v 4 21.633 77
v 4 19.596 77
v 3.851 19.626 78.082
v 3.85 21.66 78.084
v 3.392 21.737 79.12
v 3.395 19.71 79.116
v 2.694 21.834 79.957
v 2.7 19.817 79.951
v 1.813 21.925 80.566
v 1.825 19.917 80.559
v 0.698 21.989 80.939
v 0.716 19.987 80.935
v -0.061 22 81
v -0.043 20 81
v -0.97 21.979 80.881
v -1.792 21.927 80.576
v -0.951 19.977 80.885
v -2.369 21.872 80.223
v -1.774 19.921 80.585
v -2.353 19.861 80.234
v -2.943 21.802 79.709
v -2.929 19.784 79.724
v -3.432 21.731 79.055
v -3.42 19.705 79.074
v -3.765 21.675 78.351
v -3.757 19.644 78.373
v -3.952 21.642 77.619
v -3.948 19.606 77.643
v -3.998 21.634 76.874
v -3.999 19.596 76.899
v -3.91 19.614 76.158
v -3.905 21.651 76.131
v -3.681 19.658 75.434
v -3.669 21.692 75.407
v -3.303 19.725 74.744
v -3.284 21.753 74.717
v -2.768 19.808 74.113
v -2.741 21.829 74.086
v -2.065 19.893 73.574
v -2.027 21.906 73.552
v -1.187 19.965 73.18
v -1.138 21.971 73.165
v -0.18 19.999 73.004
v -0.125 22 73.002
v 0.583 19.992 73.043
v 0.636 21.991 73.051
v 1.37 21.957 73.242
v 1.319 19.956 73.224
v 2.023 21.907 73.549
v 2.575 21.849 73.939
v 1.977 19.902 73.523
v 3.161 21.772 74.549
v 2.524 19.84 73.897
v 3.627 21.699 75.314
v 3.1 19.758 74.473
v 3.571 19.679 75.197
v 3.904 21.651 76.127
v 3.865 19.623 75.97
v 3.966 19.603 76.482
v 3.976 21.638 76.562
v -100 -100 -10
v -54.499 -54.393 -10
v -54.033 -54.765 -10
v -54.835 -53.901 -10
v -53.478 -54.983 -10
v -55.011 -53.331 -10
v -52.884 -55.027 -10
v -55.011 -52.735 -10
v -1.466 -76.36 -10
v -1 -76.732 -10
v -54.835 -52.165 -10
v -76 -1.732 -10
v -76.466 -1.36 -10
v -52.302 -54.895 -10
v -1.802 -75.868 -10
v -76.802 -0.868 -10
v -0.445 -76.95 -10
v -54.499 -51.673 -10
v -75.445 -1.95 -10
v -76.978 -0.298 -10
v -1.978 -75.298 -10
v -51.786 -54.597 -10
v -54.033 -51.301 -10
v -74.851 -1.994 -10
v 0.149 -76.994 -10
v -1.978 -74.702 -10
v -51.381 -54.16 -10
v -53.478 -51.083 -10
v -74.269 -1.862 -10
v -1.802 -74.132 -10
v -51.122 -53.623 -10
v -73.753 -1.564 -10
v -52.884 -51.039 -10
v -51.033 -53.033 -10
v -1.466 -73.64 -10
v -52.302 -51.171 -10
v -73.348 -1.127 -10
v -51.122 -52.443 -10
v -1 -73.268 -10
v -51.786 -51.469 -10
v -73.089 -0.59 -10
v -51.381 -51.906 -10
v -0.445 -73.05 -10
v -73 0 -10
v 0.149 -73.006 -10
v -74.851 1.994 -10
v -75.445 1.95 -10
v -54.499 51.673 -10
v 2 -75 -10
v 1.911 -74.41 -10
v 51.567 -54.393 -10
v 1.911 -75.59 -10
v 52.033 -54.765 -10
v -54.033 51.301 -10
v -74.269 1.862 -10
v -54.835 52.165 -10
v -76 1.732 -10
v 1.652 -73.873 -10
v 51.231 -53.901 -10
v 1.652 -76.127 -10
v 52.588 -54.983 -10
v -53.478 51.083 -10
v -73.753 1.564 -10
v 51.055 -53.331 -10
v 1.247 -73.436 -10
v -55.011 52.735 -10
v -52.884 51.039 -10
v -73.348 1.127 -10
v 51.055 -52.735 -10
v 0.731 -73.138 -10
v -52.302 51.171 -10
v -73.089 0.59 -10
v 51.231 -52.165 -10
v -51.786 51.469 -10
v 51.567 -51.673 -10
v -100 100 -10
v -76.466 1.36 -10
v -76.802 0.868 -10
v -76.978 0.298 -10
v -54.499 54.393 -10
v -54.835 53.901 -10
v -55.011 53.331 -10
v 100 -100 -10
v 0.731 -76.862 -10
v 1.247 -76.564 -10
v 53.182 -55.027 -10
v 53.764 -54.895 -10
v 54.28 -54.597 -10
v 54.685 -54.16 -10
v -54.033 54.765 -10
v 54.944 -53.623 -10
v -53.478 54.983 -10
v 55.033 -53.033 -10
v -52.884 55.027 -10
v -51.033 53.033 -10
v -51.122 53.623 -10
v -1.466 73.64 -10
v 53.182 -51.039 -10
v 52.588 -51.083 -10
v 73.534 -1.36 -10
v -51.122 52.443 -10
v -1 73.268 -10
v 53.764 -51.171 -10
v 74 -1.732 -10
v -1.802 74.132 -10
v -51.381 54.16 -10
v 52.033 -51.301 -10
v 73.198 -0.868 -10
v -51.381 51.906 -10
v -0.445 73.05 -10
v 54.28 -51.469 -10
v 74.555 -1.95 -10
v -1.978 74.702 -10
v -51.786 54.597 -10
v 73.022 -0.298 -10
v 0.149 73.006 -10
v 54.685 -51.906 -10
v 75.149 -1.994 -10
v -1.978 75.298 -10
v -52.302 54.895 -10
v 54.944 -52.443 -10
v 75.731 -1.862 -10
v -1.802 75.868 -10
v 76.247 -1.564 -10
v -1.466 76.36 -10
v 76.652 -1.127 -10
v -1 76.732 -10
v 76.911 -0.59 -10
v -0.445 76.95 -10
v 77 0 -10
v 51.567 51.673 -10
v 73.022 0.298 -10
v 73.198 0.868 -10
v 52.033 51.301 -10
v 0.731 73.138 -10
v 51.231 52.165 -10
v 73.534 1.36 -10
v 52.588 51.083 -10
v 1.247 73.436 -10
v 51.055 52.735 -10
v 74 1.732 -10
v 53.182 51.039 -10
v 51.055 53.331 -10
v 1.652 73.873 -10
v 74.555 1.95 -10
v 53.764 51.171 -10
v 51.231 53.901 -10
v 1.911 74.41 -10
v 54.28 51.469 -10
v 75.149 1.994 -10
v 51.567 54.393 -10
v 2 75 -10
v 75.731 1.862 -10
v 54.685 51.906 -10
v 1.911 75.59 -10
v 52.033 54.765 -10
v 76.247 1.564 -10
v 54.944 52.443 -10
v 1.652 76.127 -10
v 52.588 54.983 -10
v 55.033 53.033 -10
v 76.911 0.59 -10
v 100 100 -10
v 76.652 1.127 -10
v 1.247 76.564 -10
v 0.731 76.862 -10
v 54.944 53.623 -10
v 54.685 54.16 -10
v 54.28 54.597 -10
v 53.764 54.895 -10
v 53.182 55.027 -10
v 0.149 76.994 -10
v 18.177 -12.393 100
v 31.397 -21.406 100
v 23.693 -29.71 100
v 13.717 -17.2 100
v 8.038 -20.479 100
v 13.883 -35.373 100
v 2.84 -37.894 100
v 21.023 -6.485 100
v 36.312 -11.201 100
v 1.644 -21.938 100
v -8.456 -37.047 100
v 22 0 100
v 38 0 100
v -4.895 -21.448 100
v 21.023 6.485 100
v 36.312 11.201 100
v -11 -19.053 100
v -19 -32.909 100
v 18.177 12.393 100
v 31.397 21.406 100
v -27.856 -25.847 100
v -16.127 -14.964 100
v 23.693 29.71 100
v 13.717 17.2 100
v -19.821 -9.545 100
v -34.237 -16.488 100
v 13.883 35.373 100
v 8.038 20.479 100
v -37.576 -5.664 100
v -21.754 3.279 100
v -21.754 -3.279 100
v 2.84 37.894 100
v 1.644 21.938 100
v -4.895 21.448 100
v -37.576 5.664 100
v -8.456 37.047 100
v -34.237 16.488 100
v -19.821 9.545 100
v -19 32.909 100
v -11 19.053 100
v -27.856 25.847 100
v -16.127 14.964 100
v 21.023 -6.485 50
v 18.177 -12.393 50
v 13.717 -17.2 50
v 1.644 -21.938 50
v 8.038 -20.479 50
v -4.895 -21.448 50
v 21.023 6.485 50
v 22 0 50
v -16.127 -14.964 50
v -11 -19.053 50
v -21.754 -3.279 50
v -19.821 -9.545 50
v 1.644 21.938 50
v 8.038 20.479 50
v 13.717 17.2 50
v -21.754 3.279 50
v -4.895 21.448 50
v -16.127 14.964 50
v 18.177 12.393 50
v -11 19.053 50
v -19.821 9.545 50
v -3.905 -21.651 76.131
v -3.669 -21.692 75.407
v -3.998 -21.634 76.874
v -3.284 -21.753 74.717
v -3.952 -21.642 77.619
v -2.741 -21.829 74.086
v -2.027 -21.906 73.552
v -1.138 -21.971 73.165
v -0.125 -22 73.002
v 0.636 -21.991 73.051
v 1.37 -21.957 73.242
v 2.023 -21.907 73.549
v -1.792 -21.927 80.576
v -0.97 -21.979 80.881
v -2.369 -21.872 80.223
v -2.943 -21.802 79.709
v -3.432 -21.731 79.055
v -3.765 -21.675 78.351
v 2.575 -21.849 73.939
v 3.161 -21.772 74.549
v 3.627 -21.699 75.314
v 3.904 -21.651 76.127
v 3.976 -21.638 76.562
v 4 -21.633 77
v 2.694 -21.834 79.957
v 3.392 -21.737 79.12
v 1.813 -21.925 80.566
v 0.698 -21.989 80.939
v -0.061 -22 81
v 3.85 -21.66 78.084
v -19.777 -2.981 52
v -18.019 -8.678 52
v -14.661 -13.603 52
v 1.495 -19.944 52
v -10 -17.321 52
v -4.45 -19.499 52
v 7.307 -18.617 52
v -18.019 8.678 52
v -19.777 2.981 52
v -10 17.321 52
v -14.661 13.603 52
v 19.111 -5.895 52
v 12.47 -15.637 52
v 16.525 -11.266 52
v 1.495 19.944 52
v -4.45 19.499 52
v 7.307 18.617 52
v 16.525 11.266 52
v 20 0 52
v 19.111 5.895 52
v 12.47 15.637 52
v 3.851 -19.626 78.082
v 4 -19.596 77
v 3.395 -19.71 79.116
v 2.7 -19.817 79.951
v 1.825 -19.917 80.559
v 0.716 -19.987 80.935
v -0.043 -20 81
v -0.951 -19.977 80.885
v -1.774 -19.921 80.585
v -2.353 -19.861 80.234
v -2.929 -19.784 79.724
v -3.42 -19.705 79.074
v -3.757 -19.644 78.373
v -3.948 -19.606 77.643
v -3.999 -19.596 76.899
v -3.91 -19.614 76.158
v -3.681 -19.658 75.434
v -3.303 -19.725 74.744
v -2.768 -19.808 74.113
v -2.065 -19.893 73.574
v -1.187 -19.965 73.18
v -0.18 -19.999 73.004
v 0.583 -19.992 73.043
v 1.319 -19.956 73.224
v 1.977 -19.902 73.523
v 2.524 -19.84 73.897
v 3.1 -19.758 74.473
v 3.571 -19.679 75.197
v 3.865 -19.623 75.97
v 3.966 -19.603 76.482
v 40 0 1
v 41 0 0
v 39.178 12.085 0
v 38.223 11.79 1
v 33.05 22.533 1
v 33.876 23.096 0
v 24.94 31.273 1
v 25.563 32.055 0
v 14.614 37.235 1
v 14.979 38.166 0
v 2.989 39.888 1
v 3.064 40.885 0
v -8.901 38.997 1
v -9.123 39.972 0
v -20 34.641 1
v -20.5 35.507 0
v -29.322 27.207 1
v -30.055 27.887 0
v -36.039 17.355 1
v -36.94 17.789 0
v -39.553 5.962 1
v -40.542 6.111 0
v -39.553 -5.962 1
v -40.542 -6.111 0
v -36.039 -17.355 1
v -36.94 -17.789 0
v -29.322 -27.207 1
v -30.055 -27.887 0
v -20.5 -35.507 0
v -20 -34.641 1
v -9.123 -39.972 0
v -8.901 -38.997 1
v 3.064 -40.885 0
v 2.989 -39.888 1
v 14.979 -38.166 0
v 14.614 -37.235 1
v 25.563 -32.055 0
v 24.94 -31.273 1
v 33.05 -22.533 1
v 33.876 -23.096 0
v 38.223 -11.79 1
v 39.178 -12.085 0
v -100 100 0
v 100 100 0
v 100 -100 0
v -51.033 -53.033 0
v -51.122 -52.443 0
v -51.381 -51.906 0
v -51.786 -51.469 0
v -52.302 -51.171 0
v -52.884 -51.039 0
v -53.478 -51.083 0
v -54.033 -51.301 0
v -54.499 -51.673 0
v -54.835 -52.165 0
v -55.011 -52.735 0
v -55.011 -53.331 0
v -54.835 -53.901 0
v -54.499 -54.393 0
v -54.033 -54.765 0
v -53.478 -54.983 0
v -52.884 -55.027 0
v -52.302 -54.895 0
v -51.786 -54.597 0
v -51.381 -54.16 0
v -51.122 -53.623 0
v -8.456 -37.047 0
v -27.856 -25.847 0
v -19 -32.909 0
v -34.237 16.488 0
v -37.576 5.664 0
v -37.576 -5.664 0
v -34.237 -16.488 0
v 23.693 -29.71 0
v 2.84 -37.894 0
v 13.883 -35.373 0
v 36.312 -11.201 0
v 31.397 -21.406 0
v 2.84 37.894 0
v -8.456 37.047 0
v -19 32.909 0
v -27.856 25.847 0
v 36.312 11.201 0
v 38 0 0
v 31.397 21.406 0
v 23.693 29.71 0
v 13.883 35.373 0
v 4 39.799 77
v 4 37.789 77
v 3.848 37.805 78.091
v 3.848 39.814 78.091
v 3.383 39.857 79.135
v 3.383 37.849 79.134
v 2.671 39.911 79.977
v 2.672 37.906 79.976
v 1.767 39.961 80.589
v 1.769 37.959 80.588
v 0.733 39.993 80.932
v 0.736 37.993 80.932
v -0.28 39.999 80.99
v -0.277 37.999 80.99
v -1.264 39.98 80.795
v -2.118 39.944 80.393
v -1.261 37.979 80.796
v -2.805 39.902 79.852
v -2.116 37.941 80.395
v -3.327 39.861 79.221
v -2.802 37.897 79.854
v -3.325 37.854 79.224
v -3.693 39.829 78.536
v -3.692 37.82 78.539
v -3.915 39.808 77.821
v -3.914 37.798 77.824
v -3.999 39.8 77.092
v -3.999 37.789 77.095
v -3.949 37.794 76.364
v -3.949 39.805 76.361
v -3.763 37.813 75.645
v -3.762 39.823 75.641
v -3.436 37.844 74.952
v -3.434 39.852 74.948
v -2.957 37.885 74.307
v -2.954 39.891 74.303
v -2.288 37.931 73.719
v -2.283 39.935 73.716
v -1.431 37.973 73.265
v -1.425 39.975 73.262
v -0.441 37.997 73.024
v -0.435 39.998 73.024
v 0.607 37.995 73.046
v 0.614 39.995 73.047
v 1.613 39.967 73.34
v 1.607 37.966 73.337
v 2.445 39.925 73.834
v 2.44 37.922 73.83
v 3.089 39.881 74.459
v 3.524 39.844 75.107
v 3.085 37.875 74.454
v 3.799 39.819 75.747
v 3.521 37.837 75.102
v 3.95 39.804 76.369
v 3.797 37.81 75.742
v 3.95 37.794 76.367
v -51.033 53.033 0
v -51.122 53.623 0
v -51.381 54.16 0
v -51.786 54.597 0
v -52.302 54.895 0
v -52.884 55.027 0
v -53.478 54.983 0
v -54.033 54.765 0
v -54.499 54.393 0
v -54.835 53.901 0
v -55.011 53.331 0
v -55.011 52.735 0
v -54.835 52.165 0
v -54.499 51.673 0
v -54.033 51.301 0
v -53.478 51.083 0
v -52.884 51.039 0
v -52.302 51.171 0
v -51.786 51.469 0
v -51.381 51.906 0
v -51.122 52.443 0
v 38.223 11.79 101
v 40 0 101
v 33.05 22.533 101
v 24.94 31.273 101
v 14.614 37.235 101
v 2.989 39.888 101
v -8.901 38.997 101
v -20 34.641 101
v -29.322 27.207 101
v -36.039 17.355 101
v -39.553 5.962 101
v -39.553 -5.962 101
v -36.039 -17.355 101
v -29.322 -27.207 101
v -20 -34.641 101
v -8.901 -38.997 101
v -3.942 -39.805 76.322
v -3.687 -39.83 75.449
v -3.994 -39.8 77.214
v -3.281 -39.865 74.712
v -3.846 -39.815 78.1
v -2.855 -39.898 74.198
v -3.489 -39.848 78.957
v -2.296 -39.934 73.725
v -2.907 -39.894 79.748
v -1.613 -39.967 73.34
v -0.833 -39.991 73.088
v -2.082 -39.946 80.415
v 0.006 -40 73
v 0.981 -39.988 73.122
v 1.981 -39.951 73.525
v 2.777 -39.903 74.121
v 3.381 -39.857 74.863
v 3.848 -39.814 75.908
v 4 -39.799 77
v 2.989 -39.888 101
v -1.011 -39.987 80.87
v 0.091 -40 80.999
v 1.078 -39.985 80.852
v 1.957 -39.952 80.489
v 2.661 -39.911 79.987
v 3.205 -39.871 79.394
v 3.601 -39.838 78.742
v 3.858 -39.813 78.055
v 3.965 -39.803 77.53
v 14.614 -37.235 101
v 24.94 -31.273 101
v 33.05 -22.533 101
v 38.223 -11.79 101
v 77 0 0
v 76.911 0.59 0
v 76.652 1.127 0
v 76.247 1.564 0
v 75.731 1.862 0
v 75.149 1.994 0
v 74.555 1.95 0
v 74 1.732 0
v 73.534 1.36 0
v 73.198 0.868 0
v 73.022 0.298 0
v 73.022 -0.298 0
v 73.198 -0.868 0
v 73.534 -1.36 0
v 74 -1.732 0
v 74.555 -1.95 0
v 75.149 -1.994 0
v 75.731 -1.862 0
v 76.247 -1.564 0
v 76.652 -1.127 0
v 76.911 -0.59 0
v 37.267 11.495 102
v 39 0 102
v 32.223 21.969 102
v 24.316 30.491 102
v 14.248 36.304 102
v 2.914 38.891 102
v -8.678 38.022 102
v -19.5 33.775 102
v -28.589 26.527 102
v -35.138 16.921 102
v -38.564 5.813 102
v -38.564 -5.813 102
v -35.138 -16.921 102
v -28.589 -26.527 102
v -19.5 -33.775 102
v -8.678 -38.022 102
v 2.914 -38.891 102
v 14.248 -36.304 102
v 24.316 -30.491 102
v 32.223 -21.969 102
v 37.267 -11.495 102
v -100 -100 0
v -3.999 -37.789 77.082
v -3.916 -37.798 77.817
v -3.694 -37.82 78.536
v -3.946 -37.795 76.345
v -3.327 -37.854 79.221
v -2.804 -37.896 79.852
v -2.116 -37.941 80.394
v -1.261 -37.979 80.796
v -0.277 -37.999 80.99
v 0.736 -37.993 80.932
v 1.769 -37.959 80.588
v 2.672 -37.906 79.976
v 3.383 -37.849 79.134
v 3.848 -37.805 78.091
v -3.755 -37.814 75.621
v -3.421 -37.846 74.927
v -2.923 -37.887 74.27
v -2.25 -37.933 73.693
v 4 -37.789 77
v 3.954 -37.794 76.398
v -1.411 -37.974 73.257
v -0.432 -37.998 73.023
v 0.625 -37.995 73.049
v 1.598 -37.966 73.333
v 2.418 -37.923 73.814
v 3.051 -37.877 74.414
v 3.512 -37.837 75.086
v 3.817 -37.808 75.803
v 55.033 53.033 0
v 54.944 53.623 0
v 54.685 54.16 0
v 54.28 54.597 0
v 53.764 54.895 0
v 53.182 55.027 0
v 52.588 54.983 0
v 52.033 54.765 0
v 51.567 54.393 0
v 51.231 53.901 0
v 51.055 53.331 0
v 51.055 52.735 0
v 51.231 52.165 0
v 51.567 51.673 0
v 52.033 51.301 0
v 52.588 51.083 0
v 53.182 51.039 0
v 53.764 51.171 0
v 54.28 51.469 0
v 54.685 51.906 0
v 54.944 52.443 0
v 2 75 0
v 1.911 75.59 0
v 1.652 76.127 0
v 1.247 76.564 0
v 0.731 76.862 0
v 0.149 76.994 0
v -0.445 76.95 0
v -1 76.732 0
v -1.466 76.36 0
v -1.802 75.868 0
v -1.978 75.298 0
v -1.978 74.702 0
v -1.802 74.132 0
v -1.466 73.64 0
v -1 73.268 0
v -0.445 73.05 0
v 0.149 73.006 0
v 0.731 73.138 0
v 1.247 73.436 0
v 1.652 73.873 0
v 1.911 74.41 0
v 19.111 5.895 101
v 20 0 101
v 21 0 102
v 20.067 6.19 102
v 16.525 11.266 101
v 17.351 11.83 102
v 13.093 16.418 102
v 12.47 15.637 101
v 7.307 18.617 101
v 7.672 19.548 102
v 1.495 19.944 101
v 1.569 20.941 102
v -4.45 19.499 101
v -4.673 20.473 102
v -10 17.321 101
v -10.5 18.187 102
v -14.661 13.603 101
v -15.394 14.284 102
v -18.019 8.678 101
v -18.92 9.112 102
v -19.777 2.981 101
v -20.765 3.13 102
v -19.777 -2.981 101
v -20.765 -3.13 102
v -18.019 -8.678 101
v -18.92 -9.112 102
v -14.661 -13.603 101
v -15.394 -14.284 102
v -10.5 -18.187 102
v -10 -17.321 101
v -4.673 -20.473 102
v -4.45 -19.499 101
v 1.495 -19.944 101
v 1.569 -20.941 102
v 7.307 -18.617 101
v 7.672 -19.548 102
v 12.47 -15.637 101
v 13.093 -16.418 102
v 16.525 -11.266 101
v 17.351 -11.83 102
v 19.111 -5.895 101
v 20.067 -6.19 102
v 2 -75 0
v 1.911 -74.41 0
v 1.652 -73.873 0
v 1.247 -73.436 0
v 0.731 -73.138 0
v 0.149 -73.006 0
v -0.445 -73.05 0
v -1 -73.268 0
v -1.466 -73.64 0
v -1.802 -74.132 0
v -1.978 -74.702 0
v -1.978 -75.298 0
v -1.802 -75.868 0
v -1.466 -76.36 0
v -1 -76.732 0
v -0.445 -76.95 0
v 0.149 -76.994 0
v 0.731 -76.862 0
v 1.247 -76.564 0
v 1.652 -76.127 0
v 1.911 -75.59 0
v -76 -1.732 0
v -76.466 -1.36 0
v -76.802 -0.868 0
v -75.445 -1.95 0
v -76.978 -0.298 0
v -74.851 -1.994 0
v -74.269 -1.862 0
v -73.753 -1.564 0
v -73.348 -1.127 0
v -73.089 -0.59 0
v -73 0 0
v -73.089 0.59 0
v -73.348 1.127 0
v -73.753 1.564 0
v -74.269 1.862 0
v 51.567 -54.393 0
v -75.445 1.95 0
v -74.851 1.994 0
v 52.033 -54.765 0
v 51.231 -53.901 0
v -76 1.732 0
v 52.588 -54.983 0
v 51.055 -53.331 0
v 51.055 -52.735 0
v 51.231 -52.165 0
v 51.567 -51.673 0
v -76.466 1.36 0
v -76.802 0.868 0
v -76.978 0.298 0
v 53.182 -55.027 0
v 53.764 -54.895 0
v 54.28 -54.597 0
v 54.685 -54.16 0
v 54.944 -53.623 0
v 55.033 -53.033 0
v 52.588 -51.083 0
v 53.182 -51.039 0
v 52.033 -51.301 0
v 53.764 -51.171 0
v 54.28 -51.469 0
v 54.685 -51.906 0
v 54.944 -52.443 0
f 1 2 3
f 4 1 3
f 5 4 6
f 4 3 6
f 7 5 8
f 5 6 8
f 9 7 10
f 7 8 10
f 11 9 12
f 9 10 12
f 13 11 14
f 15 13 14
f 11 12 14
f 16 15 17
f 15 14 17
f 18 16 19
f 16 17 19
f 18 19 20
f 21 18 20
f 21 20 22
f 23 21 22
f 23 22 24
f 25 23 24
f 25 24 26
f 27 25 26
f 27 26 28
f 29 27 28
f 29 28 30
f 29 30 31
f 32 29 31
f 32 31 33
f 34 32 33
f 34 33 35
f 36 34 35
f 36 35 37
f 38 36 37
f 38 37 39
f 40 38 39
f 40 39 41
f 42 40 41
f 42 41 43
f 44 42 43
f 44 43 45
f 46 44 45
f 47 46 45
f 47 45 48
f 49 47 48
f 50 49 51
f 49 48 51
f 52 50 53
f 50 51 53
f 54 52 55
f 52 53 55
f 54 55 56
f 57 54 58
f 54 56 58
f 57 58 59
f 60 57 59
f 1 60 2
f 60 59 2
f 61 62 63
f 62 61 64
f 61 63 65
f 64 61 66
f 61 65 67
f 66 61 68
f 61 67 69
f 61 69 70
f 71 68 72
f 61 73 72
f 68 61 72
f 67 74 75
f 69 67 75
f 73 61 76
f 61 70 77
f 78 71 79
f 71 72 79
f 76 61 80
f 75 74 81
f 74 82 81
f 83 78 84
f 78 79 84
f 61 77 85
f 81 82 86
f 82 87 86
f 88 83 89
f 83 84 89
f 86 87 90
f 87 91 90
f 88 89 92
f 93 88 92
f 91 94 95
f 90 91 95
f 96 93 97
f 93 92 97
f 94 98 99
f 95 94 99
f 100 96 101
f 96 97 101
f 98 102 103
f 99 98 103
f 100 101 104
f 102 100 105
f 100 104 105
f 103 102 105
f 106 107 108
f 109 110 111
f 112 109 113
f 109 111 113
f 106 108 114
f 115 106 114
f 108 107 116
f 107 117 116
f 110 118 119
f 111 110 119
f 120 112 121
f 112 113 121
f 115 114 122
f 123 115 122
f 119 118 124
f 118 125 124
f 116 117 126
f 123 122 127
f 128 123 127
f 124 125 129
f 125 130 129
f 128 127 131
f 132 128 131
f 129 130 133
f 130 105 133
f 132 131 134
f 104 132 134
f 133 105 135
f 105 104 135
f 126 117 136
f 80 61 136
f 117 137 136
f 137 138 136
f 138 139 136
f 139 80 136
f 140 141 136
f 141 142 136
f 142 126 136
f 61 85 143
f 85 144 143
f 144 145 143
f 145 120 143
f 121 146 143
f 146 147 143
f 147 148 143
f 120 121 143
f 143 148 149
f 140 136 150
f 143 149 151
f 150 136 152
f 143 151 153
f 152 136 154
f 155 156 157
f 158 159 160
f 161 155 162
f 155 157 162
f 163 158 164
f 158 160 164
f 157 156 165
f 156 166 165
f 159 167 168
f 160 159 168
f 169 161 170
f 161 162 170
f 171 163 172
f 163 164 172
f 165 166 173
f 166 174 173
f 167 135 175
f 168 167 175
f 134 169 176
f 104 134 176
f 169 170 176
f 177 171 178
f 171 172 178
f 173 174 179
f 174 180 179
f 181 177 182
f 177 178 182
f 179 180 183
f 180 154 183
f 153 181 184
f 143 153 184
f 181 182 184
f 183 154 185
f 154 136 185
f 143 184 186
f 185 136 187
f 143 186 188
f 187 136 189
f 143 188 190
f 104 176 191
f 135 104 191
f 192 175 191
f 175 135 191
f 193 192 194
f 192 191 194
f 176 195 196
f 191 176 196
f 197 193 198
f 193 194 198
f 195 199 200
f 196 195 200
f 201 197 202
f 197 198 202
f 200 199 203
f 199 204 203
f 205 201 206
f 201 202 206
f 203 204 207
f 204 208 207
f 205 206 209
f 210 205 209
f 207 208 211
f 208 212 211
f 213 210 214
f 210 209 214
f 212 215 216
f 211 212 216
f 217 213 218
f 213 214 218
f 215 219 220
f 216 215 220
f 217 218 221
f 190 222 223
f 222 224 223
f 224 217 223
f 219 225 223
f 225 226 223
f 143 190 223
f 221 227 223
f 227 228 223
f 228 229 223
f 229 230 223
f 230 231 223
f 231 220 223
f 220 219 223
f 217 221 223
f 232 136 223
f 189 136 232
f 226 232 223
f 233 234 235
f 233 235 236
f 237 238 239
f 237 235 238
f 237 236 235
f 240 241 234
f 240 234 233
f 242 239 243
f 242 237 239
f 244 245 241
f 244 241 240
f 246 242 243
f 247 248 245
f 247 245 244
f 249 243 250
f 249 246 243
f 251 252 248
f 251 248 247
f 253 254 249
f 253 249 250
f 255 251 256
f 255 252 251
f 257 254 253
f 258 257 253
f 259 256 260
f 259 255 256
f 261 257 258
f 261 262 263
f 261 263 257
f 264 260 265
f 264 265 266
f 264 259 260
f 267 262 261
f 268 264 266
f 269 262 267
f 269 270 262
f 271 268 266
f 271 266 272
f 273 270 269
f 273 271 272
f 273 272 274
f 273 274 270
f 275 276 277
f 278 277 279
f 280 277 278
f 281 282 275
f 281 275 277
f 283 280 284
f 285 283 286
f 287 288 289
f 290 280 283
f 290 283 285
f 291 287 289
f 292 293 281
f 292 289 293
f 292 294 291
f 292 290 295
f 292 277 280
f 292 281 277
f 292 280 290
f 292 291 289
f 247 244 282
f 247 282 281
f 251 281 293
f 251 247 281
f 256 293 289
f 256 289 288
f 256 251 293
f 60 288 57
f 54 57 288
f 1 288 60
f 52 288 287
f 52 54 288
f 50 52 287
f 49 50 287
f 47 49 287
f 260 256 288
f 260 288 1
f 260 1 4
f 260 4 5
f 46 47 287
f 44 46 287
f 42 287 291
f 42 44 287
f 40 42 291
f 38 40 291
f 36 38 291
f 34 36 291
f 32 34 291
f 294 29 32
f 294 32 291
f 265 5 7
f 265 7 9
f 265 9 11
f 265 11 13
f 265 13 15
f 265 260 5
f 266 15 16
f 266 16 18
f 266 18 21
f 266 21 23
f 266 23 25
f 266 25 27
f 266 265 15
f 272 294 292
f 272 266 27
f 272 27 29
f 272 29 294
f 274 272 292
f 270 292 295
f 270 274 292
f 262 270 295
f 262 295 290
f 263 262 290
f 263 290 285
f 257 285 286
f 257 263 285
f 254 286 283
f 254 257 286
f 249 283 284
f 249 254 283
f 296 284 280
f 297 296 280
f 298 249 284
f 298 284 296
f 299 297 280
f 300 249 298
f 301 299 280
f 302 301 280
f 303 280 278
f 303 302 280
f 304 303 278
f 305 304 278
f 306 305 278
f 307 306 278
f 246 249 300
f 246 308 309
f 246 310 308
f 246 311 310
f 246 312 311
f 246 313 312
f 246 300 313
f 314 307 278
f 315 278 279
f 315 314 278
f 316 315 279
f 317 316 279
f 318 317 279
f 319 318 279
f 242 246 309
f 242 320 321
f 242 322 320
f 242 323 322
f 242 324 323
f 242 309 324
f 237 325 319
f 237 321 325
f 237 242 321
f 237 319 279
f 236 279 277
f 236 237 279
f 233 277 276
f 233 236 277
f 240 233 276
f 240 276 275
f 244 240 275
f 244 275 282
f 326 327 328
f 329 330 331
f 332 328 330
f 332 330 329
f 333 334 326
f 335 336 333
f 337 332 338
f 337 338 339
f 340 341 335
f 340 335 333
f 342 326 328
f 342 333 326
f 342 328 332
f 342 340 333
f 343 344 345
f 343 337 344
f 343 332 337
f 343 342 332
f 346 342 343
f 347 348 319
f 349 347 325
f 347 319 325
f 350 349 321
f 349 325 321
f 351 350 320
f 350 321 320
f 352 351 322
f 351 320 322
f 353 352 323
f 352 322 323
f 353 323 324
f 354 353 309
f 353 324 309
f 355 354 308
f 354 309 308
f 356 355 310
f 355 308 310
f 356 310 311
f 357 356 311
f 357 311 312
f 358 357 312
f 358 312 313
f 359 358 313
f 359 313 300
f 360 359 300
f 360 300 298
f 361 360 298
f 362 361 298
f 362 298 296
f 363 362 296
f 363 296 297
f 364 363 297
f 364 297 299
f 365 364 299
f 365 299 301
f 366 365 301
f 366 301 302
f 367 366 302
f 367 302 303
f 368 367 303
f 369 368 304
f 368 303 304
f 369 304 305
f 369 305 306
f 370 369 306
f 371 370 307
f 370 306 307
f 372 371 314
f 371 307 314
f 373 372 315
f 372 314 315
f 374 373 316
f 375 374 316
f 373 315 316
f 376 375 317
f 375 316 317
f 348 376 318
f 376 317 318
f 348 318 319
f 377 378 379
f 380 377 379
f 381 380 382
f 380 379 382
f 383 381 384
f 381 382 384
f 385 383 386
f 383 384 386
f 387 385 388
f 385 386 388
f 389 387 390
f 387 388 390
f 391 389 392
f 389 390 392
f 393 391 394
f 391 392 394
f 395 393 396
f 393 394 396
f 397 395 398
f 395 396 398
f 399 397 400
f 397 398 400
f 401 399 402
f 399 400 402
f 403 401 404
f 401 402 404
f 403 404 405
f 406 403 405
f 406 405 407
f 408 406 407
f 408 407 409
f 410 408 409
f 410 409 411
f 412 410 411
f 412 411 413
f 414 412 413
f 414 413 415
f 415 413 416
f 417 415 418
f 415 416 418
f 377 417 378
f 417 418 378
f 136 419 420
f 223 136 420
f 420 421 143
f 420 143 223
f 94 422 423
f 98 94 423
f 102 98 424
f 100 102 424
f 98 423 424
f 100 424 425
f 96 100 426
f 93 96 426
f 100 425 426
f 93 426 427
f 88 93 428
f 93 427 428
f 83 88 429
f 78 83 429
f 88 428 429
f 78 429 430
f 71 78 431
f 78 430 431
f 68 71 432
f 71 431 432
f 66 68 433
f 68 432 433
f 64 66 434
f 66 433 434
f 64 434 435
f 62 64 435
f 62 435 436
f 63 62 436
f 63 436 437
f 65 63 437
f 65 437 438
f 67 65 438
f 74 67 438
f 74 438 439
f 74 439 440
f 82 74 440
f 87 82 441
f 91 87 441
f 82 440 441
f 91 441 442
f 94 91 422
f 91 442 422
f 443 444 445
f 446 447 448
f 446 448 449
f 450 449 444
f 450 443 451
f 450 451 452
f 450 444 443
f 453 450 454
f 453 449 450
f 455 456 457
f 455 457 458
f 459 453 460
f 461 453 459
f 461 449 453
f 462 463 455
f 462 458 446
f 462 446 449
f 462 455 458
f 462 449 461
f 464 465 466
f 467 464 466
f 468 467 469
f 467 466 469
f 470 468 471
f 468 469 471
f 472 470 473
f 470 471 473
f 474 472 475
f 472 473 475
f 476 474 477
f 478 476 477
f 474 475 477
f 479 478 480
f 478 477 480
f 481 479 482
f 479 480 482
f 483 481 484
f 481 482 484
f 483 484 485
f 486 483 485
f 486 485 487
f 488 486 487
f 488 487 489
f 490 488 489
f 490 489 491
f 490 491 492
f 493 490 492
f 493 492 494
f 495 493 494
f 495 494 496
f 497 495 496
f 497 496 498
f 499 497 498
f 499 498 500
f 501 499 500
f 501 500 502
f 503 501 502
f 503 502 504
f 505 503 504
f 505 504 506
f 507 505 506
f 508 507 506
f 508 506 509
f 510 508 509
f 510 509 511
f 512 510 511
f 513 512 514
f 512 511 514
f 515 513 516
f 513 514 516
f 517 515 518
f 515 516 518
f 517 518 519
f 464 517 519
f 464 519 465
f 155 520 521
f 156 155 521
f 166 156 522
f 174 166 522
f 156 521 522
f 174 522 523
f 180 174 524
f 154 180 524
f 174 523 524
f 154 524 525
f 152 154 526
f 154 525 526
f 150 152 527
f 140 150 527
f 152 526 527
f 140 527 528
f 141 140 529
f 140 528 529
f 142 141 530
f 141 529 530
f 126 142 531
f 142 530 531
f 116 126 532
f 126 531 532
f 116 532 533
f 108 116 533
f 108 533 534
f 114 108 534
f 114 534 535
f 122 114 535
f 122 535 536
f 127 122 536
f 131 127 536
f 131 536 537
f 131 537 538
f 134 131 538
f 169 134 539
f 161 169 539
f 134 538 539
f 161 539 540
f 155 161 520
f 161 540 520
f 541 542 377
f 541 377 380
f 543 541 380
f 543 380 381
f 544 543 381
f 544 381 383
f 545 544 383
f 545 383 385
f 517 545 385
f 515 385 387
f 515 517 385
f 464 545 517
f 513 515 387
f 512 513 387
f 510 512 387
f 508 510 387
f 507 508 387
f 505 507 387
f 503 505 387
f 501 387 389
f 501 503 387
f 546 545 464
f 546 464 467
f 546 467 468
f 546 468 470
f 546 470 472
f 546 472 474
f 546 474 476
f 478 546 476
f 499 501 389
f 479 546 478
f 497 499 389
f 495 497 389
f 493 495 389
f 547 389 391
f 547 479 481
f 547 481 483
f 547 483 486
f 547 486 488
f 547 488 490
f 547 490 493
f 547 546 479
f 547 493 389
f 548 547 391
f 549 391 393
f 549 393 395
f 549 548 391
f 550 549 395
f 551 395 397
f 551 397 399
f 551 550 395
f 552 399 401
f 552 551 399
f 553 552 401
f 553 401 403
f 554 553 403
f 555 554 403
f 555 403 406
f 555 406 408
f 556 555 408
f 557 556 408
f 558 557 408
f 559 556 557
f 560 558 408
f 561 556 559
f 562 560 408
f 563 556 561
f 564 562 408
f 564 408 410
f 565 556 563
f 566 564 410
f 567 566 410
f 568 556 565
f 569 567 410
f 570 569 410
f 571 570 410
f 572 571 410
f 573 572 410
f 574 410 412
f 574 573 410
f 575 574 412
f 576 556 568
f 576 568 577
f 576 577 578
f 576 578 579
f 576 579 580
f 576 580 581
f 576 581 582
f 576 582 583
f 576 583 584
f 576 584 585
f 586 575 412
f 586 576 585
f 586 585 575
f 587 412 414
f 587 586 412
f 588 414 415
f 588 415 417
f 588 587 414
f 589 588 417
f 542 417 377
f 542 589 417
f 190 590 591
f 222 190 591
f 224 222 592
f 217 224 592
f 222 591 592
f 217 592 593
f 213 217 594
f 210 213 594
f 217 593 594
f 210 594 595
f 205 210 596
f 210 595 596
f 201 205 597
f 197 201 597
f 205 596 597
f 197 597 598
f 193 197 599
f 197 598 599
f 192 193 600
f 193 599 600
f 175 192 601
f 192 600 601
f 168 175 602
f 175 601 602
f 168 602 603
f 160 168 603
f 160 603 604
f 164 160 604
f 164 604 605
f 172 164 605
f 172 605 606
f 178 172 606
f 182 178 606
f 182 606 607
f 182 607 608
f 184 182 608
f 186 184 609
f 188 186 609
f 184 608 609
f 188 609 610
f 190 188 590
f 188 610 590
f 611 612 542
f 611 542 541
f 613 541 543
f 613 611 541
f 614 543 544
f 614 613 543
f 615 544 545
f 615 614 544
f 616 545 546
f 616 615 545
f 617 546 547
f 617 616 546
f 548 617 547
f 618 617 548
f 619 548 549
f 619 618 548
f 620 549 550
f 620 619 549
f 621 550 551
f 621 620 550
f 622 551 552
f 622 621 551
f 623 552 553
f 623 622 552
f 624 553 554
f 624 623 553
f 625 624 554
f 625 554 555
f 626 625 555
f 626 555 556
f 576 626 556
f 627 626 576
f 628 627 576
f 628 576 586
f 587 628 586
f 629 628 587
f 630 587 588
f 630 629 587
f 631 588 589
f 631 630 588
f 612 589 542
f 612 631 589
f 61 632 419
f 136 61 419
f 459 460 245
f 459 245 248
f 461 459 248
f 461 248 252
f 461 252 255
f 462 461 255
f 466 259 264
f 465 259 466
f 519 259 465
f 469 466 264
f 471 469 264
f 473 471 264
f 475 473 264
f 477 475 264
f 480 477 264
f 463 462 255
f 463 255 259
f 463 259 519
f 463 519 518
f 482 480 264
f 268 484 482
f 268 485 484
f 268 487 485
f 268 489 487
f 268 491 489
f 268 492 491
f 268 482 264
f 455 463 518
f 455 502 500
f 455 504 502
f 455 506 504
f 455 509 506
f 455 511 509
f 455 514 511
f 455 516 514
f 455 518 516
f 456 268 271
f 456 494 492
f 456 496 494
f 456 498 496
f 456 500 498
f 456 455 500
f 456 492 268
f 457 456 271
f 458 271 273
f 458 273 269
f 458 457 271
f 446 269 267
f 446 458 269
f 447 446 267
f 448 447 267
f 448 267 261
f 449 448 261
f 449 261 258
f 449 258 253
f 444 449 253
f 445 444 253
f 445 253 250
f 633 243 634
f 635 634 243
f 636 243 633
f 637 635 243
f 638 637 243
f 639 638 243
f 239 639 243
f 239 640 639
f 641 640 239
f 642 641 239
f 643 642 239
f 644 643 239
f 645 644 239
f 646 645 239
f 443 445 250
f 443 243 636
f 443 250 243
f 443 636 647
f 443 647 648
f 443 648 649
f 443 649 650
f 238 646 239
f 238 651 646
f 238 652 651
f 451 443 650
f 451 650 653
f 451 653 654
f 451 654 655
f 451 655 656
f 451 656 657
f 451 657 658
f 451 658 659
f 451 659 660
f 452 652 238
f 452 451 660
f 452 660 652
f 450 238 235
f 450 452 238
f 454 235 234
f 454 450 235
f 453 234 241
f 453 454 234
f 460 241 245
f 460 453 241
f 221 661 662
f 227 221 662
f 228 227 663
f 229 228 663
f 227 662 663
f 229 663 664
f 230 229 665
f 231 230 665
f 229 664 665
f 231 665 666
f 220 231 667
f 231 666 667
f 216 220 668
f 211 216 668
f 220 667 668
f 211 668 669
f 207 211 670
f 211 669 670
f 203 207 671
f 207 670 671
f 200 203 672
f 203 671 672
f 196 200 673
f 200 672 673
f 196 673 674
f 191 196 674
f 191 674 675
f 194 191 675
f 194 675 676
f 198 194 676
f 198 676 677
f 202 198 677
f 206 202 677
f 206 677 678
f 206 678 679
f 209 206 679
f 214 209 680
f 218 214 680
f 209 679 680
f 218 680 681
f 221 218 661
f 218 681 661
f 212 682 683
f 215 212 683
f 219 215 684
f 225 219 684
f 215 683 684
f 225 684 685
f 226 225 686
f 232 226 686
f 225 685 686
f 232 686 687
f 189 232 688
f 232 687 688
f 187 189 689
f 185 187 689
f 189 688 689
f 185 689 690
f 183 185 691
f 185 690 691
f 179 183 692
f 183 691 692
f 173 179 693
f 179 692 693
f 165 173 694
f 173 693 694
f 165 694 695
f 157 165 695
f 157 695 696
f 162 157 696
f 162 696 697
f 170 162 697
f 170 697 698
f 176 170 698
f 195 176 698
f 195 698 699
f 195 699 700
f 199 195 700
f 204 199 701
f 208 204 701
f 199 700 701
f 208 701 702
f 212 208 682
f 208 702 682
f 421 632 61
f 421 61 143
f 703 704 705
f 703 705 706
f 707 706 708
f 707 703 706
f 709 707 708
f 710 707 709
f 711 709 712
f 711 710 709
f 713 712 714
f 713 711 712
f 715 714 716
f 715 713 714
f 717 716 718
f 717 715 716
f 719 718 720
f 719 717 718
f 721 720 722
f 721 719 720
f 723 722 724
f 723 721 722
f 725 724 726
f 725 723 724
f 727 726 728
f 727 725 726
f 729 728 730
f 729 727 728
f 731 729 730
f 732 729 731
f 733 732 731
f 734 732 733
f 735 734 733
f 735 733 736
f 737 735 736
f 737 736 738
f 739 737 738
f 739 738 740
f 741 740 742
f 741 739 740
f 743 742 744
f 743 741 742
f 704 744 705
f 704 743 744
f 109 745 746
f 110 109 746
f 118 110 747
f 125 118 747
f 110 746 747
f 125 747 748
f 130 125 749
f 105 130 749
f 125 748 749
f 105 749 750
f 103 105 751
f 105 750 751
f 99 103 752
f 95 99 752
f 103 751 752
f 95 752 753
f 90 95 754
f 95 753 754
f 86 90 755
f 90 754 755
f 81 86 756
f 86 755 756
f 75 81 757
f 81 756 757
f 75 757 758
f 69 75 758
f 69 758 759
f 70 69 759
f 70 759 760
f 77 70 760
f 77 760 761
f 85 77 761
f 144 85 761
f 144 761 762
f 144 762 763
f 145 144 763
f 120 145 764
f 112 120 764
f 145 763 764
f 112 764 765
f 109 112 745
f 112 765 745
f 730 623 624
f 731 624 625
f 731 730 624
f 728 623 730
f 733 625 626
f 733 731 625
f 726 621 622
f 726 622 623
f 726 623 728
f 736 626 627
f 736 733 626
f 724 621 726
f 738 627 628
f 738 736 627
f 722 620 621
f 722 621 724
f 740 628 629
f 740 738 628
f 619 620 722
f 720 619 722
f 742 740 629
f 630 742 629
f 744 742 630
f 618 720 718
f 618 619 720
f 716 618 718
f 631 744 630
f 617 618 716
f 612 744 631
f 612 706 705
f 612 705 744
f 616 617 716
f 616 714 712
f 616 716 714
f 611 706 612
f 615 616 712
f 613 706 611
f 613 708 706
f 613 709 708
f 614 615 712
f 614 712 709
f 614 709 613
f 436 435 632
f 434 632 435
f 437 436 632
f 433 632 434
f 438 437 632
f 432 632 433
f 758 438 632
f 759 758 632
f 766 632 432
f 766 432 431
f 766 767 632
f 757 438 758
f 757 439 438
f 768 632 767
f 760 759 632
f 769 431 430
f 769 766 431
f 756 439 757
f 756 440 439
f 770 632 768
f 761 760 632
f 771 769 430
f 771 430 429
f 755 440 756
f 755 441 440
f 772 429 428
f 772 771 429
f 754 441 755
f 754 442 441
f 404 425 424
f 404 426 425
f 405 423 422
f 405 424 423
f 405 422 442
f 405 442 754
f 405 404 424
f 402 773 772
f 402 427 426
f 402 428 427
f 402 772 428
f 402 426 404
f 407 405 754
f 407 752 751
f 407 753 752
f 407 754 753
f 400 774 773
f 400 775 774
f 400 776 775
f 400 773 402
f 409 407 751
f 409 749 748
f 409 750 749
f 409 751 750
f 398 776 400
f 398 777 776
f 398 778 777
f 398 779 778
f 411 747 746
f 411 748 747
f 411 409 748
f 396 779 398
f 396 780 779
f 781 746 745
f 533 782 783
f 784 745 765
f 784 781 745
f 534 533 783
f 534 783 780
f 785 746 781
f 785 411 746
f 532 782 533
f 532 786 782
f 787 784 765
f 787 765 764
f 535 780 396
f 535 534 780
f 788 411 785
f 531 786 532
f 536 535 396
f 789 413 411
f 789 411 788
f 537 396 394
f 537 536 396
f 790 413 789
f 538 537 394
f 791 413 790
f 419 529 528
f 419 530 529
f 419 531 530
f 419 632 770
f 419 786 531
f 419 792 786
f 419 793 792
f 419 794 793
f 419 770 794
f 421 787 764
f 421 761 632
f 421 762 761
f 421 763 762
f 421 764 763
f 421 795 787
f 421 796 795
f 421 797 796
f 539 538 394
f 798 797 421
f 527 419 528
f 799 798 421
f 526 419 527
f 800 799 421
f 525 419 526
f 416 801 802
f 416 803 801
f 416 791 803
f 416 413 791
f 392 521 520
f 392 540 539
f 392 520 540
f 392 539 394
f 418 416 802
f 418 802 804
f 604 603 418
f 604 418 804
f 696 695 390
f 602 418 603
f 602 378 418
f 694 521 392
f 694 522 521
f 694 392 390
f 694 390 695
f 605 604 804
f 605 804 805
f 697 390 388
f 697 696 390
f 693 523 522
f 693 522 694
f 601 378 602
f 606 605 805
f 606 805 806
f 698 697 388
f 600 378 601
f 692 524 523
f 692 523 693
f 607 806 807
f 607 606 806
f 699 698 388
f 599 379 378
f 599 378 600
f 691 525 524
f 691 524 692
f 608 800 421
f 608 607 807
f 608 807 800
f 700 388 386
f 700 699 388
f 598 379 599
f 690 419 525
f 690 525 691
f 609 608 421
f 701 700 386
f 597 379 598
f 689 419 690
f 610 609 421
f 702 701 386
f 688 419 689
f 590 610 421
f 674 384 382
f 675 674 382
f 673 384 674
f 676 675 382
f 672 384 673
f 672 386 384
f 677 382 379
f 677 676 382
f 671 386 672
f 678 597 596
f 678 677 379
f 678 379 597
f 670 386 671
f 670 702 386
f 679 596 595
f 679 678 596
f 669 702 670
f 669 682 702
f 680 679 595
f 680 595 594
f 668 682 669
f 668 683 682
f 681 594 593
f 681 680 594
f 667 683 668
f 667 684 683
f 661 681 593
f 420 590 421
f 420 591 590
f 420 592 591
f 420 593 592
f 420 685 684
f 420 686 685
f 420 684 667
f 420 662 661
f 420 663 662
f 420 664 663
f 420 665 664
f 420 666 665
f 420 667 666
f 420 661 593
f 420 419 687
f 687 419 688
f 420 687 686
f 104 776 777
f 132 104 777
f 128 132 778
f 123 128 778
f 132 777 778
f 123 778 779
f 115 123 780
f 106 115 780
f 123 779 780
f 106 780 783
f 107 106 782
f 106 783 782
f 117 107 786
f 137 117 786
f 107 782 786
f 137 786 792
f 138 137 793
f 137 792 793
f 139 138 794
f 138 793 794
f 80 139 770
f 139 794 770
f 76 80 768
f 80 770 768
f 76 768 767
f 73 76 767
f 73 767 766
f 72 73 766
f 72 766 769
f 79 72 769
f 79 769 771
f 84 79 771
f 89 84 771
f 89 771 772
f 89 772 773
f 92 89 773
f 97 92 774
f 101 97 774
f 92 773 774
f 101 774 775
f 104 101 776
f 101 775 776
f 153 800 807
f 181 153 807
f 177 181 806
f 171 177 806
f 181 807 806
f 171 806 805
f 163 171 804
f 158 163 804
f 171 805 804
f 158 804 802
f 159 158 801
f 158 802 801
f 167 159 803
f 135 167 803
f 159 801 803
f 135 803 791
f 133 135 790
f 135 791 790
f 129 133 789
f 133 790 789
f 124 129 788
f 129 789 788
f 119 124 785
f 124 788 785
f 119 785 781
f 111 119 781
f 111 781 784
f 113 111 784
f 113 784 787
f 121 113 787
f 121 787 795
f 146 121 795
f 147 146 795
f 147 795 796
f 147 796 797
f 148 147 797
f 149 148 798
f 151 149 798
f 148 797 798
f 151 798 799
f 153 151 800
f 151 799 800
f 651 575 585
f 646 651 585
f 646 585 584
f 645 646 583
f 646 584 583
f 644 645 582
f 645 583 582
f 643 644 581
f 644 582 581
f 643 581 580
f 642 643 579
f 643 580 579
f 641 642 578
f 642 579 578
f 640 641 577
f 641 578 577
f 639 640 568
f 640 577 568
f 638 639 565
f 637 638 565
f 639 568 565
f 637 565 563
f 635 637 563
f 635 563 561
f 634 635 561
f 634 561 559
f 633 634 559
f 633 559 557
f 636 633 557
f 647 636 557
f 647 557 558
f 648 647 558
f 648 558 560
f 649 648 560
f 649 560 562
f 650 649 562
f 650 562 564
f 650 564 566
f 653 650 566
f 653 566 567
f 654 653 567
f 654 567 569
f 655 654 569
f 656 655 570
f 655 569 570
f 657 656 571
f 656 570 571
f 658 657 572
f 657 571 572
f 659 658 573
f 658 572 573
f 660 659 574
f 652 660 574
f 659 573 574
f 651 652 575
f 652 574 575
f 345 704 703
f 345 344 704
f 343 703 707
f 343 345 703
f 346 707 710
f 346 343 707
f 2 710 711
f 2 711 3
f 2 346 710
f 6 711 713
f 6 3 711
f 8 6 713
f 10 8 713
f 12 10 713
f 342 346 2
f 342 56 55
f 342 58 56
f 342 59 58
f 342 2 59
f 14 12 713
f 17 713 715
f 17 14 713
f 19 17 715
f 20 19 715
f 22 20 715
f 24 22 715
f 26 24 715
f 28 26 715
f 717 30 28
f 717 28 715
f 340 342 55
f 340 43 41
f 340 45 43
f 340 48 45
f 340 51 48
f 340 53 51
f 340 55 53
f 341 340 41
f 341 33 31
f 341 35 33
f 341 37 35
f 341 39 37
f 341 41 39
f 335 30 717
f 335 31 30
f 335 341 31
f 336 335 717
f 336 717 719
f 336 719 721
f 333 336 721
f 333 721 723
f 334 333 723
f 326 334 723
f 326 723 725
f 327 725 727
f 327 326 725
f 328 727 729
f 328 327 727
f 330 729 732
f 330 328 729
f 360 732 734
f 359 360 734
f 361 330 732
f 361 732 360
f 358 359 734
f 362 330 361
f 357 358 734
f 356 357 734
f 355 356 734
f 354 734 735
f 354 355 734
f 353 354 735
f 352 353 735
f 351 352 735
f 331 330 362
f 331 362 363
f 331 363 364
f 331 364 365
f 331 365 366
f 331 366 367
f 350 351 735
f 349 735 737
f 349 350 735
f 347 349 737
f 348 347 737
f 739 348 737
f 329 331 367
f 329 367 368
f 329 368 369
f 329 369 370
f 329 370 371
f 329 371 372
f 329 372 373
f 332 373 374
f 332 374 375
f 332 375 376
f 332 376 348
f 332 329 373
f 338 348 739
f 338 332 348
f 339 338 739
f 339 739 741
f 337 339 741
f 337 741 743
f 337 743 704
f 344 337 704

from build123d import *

# Parameters (mm, degrees)
F0_W      = 200
F0_H      = 200
F0_R      = 2
F1_DEPTH  = 10
F2_R      = 40
F2_R_2    = 38
F3_DEPTH  = 100
F7_SIZE   = 1
F8_SIZE   = 1
F10_R     = 4
F11_DEPTH = 80
F12_DEPTH = 25


with BuildPart() as f1:
    # F0 (on Top) → F1 (new body)
    with BuildSketch(Plane.XY):
        Rectangle(F0_W, F0_H)
        with Locations((-53.033009, -53.033009)):
            Circle(F0_R, mode=Mode.SUBTRACT)
        with Locations((0, -75)):
            Circle(F0_R, mode=Mode.SUBTRACT)
        with Locations((53.033009, -53.033009)):
            Circle(F0_R, mode=Mode.SUBTRACT)
        with Locations((-75, 0)):
            Circle(F0_R, mode=Mode.SUBTRACT)
        with Locations((-53.033009, 53.033009)):
            Circle(F0_R, mode=Mode.SUBTRACT)
        with Locations((75, 0)):
            Circle(F0_R, mode=Mode.SUBTRACT)
        with Locations((0, 75)):
            Circle(F0_R, mode=Mode.SUBTRACT)
        with Locations((53.033009, 53.033009)):
            Circle(F0_R, mode=Mode.SUBTRACT)
    extrude(amount=-F1_DEPTH)

    # F2 (on face) → F3 (join)
    with BuildSketch(Plane.XY):
        Circle(F2_R)
        Circle(F2_R_2, mode=Mode.SUBTRACT)
    extrude(amount=F3_DEPTH)

    # F5 (on Front) → F6 (revolve)
    with BuildSketch(Plane.XZ):
        Polygon((0, 52), (0, 50), (22, 50), (22, 100), (40, 100), (40, 102), (20, 102), (20, 52), align=None)
    revolve(axis=Axis((0, 0, 75.148744), (0, 0, 1)))

    # F7
    f7_edges = [f1.edges().sort_by_distance(p)[0] for p in [
        (-40, 0, 0),
        (40, 0, 51),
        (-40, 0, 102),
    ]]
    chamfer(f7_edges, length=F7_SIZE)

    # F8
    f8_edges = [f1.edges().sort_by_distance(p)[0] for p in [
        (-20, 0, 102),
    ]]
    chamfer(f8_edges, length=F8_SIZE)

    # F10 (on offset) → F11 (cut)
    with BuildSketch(Plane.XZ.offset(40)):
        with Locations((0, 77)):
            Circle(F10_R)
    extrude(amount=-F11_DEPTH, mode=Mode.SUBTRACT)

    # F0 (on Top) → F12 (cut)
    with BuildSketch(Plane.XY):
        with Locations((0, 75)):
            Circle(F0_R)
    extrude(amount=-F12_DEPTH, mode=Mode.SUBTRACT)


solid = f1.part
